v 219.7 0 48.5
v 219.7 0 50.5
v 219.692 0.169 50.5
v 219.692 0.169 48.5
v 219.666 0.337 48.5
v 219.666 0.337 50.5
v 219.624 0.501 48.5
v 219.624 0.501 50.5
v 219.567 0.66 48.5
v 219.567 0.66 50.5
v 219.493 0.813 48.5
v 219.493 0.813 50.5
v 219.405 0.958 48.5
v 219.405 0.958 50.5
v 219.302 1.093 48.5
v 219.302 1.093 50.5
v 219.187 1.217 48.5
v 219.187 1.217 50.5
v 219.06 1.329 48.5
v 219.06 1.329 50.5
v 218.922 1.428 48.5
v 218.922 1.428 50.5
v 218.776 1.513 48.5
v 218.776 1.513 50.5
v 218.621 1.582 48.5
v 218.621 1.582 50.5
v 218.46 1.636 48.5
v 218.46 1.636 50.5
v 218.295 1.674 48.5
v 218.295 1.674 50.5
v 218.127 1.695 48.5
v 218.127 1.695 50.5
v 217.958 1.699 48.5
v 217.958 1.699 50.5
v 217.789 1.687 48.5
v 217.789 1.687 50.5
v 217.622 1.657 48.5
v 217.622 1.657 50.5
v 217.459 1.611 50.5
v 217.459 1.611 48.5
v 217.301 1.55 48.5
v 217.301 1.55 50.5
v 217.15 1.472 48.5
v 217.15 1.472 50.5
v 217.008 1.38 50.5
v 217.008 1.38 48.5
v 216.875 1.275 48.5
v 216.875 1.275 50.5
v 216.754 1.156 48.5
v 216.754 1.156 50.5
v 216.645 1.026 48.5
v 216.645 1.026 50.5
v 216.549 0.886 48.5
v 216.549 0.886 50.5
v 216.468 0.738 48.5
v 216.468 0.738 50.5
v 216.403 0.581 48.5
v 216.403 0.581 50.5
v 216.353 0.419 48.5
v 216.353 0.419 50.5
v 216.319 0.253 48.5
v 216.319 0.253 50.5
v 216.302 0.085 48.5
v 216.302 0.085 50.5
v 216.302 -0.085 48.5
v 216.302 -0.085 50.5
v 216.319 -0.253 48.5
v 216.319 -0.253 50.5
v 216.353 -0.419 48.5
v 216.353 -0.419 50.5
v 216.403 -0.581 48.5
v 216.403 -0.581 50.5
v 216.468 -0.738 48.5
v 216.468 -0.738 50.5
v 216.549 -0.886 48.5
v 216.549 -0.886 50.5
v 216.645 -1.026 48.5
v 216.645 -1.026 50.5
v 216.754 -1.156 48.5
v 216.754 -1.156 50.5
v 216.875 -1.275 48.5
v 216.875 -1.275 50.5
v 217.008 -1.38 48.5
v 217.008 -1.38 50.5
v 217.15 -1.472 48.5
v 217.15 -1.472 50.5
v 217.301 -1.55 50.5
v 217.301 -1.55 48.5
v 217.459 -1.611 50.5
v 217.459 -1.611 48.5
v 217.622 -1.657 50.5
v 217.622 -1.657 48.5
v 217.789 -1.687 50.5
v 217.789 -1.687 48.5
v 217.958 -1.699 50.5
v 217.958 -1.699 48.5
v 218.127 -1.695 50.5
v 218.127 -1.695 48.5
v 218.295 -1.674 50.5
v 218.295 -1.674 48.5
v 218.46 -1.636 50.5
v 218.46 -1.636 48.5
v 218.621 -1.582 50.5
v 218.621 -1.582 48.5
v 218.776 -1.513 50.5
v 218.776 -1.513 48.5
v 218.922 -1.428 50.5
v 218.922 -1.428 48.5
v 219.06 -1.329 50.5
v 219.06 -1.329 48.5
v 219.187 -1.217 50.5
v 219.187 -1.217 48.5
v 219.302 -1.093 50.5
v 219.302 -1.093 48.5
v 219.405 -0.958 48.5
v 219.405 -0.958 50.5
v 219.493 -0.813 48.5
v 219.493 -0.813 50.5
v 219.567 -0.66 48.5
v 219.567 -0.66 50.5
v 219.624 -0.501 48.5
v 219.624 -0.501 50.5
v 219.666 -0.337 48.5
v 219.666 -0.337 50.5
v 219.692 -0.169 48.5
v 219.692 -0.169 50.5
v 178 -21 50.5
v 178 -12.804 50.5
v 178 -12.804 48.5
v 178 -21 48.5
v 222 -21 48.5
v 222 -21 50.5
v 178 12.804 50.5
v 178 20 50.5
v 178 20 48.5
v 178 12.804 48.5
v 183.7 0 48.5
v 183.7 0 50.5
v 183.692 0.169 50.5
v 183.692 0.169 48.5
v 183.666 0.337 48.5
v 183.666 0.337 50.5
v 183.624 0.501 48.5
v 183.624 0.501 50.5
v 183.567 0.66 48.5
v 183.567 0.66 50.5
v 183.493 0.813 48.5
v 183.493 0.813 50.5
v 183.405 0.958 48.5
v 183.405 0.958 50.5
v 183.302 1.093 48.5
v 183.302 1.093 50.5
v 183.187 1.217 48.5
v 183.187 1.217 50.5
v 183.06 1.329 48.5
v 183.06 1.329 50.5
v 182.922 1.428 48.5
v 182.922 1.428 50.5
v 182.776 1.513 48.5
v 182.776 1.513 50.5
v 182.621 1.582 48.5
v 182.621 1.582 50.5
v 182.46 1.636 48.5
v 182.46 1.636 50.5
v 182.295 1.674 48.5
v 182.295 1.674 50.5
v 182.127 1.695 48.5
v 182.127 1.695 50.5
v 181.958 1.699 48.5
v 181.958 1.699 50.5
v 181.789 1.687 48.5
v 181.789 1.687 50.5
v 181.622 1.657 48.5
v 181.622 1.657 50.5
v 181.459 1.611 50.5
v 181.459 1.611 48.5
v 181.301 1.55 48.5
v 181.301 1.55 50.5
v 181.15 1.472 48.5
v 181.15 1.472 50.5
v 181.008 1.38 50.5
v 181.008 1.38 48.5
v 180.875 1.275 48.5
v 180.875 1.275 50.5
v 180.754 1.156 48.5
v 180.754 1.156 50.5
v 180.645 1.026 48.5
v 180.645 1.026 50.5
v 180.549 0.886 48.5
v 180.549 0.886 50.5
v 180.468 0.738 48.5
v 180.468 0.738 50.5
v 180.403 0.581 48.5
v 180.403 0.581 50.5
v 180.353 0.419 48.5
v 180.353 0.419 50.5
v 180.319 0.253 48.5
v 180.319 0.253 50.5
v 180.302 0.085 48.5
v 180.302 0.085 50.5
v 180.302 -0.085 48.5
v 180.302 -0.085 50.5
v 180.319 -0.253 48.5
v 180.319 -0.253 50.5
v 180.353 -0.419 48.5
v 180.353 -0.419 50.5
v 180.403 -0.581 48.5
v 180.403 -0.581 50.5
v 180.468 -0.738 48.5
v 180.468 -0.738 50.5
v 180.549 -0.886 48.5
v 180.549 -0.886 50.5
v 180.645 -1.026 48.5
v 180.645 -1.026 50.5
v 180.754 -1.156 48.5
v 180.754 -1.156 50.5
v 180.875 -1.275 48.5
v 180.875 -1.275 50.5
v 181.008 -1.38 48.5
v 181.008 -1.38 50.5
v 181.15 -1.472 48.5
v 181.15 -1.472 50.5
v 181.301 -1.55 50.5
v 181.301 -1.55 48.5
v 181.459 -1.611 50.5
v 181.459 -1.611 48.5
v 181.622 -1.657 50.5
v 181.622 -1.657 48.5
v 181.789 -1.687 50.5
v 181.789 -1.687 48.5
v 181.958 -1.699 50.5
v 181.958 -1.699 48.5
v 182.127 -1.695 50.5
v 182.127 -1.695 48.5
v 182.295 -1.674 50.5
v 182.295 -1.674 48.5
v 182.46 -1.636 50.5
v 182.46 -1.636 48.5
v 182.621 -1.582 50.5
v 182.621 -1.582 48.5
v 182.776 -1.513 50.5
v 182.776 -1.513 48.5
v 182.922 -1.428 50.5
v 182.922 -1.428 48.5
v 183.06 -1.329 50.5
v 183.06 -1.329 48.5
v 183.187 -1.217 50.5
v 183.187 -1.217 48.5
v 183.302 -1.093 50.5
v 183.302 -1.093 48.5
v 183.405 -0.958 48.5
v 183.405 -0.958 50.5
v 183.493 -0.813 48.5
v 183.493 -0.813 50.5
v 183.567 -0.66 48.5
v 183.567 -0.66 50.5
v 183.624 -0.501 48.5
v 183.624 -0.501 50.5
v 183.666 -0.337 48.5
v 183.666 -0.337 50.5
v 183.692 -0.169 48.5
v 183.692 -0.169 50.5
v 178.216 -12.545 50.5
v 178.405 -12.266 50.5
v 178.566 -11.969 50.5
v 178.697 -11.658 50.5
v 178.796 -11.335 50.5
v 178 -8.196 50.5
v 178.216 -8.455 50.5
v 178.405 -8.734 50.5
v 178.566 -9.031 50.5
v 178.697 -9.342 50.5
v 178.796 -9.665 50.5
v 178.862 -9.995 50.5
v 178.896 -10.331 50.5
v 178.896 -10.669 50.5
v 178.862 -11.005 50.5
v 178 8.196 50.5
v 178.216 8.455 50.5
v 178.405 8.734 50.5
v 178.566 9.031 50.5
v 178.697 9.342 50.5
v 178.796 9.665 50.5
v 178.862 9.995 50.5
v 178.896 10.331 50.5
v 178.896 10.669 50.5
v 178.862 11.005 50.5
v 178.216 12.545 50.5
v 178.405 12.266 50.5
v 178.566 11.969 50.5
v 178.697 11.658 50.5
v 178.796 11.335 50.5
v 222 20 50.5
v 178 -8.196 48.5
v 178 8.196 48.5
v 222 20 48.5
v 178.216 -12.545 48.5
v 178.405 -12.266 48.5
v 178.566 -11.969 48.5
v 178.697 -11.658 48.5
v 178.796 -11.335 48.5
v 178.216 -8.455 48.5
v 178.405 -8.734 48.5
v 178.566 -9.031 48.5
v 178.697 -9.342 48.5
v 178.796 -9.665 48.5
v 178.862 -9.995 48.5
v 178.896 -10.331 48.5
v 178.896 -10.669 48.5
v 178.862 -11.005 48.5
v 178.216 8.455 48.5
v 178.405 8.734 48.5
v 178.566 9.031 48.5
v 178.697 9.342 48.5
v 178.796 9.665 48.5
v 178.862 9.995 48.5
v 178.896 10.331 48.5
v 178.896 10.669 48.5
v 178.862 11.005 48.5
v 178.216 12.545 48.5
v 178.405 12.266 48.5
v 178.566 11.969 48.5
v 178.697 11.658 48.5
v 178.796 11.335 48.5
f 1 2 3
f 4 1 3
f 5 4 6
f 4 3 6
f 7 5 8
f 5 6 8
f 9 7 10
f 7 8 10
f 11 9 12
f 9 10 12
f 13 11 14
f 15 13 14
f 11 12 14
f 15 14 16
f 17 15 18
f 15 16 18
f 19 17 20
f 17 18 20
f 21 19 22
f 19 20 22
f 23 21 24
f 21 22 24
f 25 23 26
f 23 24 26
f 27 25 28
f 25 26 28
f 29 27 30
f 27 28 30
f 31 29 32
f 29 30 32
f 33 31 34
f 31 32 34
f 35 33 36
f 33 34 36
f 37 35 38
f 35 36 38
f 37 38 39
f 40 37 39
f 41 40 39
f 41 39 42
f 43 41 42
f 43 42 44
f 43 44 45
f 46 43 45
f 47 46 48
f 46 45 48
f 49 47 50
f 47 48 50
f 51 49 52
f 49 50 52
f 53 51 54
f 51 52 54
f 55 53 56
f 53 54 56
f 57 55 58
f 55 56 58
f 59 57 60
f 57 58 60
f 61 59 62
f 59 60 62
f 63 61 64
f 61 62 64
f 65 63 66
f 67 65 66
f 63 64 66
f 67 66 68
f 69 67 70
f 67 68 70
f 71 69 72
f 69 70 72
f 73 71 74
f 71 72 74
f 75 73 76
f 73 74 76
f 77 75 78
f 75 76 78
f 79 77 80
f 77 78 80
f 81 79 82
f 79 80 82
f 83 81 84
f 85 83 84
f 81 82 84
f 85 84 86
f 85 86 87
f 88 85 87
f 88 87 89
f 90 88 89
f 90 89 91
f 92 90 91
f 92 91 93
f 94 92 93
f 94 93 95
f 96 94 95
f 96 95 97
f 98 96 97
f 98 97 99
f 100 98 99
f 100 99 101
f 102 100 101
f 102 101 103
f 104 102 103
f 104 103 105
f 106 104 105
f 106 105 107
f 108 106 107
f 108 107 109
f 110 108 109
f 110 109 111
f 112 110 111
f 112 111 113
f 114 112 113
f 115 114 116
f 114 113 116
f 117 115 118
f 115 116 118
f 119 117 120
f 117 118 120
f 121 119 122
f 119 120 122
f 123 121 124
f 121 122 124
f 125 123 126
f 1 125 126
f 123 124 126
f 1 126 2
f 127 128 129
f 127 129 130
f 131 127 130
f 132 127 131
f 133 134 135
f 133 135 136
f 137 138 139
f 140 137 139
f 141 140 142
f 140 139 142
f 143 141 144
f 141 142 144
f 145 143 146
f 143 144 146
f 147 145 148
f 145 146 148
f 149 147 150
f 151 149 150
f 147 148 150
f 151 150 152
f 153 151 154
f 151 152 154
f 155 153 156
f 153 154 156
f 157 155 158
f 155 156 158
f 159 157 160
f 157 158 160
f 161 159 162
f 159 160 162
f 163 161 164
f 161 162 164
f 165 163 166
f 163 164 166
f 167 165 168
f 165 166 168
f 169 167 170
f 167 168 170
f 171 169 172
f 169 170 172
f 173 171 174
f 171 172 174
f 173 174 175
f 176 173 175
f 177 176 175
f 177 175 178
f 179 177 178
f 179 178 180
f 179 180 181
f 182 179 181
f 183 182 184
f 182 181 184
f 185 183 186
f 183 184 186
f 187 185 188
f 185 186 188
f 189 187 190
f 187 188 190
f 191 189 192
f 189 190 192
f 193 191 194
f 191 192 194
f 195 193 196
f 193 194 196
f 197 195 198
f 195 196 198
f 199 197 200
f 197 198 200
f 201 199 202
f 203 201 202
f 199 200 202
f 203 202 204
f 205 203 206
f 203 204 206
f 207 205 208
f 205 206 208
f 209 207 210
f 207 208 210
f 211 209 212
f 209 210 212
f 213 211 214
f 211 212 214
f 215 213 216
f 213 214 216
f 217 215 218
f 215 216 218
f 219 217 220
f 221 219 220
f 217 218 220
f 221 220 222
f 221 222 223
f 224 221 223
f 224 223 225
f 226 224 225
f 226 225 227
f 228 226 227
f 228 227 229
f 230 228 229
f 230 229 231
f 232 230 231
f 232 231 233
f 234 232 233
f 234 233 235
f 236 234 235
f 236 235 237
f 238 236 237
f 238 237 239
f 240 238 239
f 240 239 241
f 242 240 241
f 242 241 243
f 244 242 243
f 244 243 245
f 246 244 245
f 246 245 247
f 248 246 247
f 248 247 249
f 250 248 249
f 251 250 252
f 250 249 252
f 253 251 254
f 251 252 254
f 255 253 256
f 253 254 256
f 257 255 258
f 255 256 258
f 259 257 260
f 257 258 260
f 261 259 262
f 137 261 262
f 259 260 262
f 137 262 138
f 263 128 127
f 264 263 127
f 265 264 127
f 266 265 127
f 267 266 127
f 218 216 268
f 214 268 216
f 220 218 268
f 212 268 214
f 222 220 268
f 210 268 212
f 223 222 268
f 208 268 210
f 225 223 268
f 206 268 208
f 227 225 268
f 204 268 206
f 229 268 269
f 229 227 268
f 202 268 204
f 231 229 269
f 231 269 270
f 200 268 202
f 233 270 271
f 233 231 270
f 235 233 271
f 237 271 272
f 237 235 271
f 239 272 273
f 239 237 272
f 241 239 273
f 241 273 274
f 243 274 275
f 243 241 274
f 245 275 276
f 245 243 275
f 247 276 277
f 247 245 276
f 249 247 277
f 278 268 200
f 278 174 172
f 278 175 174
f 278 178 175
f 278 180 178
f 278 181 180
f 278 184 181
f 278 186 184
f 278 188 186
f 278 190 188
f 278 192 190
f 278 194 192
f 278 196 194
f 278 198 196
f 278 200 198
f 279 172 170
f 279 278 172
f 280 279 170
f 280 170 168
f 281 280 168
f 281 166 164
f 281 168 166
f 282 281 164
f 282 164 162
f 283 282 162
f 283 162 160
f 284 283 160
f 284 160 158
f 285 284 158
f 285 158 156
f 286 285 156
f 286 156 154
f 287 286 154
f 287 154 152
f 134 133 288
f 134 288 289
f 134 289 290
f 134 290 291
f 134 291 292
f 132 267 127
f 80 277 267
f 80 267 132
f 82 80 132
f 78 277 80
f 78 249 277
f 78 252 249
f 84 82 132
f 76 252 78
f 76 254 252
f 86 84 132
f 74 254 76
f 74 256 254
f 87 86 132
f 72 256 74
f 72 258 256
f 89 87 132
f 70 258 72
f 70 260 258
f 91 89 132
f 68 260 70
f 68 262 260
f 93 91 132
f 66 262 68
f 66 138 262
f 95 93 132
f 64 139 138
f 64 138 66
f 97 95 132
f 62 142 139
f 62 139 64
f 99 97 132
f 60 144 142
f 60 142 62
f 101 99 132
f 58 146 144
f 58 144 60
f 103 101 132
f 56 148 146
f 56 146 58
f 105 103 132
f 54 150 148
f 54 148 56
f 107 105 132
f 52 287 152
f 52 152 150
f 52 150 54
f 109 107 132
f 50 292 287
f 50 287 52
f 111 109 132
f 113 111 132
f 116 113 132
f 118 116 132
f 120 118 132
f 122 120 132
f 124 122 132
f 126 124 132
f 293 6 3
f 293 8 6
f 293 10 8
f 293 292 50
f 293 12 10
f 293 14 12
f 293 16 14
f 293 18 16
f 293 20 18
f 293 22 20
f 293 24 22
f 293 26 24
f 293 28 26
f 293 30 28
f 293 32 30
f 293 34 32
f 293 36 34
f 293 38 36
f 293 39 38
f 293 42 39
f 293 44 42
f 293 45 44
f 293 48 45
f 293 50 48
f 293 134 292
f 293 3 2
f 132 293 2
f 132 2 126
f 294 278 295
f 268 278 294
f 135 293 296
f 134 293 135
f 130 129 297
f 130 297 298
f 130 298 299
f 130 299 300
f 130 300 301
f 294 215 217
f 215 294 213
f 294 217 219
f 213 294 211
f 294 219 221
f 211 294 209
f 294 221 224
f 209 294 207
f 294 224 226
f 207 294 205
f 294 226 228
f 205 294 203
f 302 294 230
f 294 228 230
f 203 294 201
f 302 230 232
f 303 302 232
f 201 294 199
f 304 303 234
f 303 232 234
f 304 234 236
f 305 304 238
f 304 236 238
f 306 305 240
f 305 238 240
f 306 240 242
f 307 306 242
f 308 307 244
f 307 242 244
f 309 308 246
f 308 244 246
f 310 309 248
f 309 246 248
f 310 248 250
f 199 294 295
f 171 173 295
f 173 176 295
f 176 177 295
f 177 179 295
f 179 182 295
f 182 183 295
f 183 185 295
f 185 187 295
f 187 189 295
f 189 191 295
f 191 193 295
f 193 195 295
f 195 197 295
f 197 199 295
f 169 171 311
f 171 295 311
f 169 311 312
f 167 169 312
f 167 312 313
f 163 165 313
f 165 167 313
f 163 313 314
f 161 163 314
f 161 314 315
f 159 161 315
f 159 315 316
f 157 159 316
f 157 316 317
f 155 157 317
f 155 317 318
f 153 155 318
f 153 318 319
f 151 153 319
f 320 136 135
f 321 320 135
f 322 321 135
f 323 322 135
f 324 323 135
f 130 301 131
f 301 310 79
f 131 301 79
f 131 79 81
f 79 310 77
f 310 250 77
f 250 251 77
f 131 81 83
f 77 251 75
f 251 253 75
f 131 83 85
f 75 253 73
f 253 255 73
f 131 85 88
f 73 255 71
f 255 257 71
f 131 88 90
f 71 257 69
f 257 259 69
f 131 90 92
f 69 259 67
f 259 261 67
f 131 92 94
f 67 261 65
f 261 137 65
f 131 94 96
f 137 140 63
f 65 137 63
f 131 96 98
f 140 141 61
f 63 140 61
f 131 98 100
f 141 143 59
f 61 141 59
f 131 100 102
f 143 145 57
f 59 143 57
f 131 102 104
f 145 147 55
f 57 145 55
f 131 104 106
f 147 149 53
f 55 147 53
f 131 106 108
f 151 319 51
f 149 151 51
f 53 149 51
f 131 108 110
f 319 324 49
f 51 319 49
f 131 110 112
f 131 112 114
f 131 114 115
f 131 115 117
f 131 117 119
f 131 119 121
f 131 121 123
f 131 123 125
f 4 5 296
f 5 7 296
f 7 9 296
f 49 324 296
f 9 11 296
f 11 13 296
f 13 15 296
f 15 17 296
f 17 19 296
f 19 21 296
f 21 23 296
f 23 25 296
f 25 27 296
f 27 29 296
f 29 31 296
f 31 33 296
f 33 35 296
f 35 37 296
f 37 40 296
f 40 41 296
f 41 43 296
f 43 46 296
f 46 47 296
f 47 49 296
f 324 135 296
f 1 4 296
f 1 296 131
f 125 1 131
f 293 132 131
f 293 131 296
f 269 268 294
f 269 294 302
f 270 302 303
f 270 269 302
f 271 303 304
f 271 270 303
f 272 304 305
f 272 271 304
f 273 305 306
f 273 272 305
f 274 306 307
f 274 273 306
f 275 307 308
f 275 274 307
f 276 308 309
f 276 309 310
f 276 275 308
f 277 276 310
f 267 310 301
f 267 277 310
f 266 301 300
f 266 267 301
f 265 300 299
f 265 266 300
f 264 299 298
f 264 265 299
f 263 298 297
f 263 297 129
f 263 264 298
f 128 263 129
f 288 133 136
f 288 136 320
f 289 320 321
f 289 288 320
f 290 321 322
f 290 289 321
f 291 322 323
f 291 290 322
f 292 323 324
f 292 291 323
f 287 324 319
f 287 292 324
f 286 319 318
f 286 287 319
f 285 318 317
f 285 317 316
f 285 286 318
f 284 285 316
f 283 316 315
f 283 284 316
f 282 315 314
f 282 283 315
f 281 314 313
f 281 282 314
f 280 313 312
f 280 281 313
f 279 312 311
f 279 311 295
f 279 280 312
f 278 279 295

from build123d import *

# Parameters (mm, degrees)
MAIN_PROFILE_SKETCH_R = 1.7
MAIN_EXTRUSION_DEPTH  = 2


with BuildPart() as part:
    # Main Profile Sketch → Main Extrusion (new body)
    with BuildSketch(Plane.XY.offset(50.5)):
        with BuildLine():
            Line((178, 8.195656276), (178, -8.195656276))
            ThreePointArc((178, -8.195656276), (178.9, -10.5), (178, -12.804343724))
            Line((178, -12.804343724), (178, -21))
            Line((178, -21), (222, -21))
            Line((222, -21), (222, 20))
            Line((222, 20), (178, 20))
            Line((178, 20), (178, 12.804343724))
            ThreePointArc((178, 12.804343724), (178.9, 10.5), (178, 8.195656276))
        make_face()
        with Locations((182, 0)):
            Circle(MAIN_PROFILE_SKETCH_R, mode=Mode.SUBTRACT)
        with Locations((218, 0)):
            Circle(MAIN_PROFILE_SKETCH_R, mode=Mode.SUBTRACT)
    extrude(amount=-MAIN_EXTRUSION_DEPTH)


solid = part.part
